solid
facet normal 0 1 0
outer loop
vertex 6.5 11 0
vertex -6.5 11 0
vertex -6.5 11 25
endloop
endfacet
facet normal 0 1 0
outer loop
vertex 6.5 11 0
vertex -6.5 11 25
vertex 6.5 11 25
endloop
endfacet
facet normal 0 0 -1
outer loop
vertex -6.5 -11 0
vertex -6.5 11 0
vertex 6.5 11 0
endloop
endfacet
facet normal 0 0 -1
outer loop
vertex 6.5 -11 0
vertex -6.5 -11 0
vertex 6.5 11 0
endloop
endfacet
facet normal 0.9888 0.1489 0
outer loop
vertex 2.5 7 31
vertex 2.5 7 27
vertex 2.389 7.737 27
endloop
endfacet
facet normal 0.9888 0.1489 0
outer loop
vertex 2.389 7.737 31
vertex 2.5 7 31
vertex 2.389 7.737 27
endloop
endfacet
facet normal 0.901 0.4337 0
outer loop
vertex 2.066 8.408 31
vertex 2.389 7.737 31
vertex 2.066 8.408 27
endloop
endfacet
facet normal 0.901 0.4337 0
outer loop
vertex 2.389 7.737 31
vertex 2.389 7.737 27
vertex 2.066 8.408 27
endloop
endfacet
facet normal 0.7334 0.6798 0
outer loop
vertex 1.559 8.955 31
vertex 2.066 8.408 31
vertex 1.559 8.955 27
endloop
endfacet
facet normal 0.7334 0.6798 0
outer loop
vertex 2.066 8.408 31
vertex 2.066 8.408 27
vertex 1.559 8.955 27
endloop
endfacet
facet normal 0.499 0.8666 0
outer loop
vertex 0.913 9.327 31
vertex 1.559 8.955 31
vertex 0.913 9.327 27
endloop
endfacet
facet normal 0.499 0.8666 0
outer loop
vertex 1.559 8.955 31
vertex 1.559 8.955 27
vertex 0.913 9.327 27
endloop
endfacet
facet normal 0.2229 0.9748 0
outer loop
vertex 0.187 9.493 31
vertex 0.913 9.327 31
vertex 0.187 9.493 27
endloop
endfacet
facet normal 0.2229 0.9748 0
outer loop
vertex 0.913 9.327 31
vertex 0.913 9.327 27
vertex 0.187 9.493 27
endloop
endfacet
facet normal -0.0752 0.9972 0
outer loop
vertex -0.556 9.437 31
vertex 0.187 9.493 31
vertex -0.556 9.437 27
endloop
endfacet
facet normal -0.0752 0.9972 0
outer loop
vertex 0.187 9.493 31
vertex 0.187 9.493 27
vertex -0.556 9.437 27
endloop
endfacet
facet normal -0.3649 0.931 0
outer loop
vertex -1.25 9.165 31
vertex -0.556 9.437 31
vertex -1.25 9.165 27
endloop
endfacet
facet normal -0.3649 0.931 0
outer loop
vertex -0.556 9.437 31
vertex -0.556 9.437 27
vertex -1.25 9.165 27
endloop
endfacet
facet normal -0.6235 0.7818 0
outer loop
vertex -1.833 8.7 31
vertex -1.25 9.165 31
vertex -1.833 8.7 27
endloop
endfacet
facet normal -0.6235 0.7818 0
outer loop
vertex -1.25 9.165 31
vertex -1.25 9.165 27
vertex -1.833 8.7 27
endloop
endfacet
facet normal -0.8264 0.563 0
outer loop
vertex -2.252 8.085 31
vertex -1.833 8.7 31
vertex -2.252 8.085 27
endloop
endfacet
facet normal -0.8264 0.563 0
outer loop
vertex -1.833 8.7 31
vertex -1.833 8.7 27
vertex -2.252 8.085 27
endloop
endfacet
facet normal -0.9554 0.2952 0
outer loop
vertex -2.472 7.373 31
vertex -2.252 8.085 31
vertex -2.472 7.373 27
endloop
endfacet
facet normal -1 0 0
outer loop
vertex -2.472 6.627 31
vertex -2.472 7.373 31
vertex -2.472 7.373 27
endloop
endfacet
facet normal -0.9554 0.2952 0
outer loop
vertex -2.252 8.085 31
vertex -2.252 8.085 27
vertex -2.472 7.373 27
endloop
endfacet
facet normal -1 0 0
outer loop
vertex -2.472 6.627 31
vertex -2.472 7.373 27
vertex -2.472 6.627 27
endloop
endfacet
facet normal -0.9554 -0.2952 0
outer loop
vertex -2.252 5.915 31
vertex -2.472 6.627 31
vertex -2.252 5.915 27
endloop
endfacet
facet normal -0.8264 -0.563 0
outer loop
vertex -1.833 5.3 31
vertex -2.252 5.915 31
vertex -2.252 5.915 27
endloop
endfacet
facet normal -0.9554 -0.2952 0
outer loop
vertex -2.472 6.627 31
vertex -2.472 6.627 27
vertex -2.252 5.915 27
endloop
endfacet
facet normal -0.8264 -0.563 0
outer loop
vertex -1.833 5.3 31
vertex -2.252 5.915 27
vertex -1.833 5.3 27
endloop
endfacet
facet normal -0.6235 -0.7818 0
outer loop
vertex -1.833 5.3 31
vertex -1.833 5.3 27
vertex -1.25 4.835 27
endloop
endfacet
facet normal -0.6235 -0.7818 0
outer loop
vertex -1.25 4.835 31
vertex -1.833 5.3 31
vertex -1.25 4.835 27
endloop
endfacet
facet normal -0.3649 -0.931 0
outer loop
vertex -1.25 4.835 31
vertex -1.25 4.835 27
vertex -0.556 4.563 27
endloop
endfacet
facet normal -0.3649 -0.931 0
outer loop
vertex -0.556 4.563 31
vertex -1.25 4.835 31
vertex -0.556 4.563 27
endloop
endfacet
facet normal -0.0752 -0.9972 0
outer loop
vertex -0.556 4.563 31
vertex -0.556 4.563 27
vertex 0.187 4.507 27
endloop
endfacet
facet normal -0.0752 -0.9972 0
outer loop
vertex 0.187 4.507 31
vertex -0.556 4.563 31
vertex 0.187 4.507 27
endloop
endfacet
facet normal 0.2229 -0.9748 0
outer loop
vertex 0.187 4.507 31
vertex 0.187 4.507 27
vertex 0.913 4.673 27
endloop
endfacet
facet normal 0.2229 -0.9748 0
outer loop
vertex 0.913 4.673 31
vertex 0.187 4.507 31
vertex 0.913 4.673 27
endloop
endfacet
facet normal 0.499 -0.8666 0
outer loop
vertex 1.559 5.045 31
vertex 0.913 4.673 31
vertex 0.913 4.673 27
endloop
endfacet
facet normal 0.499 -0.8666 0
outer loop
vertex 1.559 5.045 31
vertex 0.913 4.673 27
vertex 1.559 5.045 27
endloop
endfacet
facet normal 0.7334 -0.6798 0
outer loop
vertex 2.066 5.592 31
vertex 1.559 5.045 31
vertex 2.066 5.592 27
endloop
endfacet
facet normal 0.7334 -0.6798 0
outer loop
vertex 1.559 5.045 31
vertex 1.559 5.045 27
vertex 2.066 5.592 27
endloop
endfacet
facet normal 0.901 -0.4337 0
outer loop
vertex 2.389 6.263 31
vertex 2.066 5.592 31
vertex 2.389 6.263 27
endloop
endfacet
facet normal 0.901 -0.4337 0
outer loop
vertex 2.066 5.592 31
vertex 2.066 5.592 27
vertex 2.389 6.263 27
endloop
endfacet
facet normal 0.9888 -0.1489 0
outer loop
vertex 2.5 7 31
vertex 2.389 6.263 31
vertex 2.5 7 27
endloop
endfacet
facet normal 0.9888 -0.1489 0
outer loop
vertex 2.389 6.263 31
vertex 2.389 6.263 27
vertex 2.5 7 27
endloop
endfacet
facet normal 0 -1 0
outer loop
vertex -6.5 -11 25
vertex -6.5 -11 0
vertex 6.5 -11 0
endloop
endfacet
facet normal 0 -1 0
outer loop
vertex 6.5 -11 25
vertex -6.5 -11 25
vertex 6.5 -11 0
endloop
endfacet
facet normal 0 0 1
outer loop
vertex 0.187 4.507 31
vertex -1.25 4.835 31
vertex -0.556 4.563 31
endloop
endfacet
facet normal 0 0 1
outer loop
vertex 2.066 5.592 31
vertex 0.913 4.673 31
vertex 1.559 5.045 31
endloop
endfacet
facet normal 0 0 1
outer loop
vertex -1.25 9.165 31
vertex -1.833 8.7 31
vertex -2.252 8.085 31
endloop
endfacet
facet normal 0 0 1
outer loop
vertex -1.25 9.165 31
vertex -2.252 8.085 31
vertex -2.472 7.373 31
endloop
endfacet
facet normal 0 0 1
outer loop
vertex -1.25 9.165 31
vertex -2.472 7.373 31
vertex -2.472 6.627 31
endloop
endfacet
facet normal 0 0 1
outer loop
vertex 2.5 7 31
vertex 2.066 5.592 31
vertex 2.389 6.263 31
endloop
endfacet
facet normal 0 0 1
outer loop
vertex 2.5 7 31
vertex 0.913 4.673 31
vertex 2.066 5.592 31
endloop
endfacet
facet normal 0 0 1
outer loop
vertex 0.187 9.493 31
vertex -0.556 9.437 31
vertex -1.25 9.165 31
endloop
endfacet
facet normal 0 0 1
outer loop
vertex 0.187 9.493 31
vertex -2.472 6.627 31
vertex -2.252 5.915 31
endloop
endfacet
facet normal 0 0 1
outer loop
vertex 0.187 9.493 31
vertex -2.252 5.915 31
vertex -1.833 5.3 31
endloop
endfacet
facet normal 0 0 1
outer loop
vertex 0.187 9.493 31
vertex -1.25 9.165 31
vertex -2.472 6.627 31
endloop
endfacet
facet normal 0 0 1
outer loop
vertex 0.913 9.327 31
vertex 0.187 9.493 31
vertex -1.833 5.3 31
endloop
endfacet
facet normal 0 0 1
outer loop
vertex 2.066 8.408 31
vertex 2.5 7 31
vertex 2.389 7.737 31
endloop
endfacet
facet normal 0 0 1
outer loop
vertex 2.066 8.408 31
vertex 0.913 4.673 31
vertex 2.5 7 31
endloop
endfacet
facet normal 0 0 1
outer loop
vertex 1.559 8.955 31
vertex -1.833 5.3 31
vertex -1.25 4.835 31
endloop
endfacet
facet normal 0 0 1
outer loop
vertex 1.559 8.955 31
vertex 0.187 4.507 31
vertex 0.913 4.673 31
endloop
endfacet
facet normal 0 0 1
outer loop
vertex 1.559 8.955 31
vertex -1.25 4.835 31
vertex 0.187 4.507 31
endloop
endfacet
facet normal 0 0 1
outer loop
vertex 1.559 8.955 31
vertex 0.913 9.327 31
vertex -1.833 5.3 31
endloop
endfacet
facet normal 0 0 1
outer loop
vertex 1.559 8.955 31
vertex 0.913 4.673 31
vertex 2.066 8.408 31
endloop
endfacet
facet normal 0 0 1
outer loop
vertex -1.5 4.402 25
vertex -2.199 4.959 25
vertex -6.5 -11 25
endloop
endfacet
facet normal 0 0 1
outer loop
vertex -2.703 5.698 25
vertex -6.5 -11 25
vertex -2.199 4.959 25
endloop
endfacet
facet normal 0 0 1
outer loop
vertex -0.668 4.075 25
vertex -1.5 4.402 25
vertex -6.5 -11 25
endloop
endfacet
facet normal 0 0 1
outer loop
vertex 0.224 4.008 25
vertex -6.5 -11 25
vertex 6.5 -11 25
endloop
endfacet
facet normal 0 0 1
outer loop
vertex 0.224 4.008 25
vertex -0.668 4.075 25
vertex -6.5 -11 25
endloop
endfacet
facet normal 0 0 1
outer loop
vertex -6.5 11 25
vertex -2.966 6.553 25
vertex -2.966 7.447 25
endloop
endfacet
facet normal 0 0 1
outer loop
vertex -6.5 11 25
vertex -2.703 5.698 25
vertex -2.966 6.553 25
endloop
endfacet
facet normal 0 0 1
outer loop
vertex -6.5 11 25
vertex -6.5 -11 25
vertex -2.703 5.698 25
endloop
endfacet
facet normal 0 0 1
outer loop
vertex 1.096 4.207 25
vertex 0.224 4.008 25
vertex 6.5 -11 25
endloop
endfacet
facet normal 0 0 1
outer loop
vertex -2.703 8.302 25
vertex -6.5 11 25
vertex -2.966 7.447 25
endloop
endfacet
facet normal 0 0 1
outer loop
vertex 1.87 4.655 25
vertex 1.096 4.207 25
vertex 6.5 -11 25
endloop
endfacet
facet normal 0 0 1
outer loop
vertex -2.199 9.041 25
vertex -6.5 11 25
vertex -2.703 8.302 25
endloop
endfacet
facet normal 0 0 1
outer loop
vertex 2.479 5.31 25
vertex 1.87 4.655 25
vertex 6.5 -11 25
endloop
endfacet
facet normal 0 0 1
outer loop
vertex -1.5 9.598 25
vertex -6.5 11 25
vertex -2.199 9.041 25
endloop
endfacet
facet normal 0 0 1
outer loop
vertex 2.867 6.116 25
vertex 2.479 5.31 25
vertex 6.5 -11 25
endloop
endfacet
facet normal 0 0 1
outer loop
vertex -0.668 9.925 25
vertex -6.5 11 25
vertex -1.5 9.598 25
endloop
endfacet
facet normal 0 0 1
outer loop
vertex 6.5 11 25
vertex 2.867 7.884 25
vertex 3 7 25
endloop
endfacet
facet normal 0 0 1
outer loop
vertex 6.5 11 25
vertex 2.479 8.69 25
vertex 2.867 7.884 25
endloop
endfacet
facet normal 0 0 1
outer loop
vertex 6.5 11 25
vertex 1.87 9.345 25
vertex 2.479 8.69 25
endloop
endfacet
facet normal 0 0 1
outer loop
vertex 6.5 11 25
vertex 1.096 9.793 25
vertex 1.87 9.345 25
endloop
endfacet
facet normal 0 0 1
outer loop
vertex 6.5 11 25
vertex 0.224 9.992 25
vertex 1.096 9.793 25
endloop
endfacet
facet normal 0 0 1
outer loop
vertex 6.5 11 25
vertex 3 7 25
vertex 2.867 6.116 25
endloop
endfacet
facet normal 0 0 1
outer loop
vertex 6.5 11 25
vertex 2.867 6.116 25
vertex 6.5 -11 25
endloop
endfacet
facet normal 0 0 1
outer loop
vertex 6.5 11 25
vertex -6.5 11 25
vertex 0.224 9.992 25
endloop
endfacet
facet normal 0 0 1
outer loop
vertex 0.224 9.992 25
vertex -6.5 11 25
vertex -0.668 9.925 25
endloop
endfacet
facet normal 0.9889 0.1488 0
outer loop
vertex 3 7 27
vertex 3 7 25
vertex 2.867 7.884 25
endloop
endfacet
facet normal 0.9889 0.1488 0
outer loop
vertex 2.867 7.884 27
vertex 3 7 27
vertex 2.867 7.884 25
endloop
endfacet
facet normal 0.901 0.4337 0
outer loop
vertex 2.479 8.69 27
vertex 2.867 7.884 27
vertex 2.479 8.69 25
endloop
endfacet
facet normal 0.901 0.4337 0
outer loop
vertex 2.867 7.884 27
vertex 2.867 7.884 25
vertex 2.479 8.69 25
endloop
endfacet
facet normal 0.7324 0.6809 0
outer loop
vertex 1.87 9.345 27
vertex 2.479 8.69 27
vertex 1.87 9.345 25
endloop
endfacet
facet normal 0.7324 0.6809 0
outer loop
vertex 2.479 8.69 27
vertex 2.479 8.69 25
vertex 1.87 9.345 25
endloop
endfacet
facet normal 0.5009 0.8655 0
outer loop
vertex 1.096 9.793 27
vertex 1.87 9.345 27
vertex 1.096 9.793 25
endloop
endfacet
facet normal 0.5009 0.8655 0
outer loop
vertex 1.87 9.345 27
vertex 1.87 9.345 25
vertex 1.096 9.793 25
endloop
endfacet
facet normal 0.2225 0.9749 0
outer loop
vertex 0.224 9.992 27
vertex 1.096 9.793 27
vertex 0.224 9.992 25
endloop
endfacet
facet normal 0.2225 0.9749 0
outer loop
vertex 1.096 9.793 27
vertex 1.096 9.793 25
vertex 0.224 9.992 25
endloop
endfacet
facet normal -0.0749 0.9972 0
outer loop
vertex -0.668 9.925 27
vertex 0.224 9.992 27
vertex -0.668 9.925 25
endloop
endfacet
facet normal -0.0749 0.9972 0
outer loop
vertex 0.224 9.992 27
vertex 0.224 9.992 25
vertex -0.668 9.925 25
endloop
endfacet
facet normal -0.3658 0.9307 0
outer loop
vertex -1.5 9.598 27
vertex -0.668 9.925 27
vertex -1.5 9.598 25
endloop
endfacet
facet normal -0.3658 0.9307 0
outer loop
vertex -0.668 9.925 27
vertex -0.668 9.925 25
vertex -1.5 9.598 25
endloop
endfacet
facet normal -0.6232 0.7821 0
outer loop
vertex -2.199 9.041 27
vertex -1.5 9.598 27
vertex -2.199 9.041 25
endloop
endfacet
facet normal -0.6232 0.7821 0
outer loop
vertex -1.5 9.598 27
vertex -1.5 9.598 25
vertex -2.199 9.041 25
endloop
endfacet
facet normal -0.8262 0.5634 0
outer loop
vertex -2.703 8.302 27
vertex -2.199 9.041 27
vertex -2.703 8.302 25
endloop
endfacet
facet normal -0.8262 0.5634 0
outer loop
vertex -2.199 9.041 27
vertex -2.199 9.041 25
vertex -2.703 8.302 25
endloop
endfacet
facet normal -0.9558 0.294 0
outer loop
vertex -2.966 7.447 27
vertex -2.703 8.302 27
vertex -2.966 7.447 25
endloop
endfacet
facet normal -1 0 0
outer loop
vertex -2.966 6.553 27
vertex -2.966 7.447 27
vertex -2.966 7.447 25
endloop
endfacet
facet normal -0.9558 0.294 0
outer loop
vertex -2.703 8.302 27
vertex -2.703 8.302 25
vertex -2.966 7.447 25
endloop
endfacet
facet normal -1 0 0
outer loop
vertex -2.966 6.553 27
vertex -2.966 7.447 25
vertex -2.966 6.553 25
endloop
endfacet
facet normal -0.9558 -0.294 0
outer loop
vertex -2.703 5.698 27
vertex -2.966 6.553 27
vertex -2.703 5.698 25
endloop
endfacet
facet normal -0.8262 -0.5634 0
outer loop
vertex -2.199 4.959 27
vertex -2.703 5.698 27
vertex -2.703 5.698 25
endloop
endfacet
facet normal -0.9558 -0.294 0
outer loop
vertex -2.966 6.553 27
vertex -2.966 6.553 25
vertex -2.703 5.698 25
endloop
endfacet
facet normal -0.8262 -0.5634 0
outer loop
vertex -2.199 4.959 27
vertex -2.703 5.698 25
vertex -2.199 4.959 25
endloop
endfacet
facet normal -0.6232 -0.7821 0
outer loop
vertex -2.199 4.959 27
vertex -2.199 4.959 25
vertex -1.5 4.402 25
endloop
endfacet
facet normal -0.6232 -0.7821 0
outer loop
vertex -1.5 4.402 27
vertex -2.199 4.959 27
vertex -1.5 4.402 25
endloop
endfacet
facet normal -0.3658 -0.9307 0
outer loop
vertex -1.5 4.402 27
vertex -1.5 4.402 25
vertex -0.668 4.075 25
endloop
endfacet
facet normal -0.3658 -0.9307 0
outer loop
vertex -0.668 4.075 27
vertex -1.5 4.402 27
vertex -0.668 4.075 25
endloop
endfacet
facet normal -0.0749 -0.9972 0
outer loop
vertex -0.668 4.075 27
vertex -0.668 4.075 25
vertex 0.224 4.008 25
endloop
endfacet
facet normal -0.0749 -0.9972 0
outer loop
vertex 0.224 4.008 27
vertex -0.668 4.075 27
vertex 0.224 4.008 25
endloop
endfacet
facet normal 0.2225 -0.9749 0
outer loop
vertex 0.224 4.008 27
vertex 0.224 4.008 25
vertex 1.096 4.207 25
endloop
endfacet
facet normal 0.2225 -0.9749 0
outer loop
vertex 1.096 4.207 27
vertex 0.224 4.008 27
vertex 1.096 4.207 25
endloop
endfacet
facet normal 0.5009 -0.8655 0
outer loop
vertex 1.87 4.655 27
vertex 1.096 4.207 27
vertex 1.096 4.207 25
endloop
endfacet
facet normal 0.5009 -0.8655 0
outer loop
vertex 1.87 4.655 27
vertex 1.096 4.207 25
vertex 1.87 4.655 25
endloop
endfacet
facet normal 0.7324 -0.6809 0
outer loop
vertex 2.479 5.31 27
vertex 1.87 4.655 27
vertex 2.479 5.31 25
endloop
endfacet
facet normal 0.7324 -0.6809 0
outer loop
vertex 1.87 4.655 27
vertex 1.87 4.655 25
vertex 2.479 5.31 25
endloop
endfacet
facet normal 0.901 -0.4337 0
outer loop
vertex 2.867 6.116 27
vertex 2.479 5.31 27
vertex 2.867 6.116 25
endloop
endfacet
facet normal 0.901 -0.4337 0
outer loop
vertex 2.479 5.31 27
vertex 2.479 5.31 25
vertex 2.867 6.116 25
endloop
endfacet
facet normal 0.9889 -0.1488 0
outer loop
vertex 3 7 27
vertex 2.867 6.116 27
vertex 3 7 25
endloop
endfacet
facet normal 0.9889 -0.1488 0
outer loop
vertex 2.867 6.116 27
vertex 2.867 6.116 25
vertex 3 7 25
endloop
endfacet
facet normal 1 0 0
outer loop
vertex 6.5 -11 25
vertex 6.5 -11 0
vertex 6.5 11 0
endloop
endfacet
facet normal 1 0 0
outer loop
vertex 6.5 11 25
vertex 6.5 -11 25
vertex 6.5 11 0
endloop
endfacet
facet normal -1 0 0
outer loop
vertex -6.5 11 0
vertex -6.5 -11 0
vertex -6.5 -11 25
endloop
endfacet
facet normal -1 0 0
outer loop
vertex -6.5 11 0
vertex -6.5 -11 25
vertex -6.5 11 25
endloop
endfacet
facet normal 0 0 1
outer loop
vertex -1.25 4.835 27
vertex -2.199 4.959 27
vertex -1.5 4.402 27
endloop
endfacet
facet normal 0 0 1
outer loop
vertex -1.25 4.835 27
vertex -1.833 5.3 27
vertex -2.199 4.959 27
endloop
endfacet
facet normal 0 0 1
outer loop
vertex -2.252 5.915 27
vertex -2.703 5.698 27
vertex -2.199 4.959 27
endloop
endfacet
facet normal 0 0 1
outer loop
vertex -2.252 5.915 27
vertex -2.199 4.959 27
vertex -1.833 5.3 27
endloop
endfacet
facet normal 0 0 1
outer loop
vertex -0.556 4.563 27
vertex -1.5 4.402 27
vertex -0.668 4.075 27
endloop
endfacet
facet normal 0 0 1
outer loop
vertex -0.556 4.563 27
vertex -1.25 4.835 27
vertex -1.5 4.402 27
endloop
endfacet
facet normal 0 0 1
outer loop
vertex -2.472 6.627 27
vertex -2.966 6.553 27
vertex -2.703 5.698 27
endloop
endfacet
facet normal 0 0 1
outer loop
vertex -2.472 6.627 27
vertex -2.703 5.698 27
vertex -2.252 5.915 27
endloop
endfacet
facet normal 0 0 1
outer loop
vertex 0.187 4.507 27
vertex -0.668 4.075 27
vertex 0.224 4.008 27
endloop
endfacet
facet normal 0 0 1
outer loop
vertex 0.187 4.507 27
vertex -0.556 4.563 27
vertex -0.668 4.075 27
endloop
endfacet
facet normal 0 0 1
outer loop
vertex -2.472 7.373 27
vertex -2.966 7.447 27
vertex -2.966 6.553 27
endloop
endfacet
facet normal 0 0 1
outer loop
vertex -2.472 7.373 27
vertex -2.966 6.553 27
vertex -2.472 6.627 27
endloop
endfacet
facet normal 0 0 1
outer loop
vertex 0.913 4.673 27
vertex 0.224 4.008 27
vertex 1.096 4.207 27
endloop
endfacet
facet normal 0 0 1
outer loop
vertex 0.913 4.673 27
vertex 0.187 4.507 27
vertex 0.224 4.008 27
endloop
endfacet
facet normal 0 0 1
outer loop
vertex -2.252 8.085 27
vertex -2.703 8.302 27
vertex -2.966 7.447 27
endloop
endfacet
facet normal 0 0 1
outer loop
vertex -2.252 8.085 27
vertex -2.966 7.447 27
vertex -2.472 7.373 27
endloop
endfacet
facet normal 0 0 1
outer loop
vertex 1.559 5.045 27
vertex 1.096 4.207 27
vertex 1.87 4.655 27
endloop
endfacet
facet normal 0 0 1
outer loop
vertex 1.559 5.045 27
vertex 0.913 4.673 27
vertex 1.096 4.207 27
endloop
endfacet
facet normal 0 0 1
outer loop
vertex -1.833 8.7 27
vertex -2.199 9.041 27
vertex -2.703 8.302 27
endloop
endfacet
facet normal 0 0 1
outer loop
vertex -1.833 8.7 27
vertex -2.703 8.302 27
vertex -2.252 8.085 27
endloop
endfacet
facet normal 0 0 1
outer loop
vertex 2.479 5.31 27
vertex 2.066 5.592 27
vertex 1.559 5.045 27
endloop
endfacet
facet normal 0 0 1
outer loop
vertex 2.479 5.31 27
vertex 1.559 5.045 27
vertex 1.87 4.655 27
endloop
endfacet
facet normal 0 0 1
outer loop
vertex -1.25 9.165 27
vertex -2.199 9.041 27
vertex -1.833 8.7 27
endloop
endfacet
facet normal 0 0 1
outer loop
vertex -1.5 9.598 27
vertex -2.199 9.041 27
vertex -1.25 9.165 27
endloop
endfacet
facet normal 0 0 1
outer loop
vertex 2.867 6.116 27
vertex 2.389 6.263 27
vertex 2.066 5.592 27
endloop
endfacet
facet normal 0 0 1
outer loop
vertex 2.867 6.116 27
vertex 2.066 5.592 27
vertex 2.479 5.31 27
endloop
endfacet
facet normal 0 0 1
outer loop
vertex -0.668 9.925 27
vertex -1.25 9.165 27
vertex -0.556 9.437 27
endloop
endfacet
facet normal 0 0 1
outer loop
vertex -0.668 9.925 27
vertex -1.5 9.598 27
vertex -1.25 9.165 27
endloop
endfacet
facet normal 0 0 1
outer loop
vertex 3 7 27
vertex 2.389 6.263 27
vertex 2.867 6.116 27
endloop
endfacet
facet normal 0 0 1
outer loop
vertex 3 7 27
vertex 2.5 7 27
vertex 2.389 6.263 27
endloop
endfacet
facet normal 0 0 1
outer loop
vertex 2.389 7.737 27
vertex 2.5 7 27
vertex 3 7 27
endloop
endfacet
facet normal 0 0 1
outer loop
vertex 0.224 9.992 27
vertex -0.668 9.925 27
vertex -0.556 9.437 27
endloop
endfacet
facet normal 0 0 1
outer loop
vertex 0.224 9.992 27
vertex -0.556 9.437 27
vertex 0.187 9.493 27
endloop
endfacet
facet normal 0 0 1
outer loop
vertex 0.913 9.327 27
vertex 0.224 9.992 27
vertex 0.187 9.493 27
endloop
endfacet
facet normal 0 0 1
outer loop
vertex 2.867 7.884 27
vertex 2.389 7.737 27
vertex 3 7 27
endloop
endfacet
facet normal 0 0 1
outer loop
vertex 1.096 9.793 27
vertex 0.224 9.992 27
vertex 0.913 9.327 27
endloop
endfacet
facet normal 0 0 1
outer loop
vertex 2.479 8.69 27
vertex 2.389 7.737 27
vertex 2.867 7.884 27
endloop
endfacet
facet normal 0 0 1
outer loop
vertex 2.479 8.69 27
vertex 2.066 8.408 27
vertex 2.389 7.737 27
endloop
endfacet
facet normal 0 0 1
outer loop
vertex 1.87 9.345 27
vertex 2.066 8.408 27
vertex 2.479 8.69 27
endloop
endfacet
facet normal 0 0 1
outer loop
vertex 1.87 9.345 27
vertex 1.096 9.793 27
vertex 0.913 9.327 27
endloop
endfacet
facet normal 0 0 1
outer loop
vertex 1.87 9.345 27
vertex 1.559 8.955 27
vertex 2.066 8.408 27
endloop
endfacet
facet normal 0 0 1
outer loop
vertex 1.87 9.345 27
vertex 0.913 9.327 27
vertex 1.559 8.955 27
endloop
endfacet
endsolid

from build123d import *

# Parameters (mm, degrees)
SKETCH1_W           = 13
SKETCH1_H           = 22
BOSS_EXTRUDE1_DEPTH = 25
SKETCH2_R           = 3
BOSS_EXTRUDE2_DEPTH = 2
SKETCH3_R           = 2.5
BOSS_EXTRUDE3_DEPTH = 4


with BuildPart() as part:
    # Sketch1 → Boss-Extrude1 (new body)
    with BuildSketch(Plane.XY):
        Rectangle(SKETCH1_W, SKETCH1_H)
    extrude(amount=BOSS_EXTRUDE1_DEPTH)

    # Sketch2 → Boss-Extrude2 (add)
    with BuildSketch(Plane.XY.offset(25)):
        with Locations((0, 7)):
            Circle(SKETCH2_R)
    extrude(amount=BOSS_EXTRUDE2_DEPTH)

    # Sketch3 → Boss-Extrude3 (add)
    with BuildSketch(Plane.XY.offset(27)):
        with Locations((0, 7)):
            Circle(SKETCH3_R)
    extrude(amount=BOSS_EXTRUDE3_DEPTH)


solid = part.part
